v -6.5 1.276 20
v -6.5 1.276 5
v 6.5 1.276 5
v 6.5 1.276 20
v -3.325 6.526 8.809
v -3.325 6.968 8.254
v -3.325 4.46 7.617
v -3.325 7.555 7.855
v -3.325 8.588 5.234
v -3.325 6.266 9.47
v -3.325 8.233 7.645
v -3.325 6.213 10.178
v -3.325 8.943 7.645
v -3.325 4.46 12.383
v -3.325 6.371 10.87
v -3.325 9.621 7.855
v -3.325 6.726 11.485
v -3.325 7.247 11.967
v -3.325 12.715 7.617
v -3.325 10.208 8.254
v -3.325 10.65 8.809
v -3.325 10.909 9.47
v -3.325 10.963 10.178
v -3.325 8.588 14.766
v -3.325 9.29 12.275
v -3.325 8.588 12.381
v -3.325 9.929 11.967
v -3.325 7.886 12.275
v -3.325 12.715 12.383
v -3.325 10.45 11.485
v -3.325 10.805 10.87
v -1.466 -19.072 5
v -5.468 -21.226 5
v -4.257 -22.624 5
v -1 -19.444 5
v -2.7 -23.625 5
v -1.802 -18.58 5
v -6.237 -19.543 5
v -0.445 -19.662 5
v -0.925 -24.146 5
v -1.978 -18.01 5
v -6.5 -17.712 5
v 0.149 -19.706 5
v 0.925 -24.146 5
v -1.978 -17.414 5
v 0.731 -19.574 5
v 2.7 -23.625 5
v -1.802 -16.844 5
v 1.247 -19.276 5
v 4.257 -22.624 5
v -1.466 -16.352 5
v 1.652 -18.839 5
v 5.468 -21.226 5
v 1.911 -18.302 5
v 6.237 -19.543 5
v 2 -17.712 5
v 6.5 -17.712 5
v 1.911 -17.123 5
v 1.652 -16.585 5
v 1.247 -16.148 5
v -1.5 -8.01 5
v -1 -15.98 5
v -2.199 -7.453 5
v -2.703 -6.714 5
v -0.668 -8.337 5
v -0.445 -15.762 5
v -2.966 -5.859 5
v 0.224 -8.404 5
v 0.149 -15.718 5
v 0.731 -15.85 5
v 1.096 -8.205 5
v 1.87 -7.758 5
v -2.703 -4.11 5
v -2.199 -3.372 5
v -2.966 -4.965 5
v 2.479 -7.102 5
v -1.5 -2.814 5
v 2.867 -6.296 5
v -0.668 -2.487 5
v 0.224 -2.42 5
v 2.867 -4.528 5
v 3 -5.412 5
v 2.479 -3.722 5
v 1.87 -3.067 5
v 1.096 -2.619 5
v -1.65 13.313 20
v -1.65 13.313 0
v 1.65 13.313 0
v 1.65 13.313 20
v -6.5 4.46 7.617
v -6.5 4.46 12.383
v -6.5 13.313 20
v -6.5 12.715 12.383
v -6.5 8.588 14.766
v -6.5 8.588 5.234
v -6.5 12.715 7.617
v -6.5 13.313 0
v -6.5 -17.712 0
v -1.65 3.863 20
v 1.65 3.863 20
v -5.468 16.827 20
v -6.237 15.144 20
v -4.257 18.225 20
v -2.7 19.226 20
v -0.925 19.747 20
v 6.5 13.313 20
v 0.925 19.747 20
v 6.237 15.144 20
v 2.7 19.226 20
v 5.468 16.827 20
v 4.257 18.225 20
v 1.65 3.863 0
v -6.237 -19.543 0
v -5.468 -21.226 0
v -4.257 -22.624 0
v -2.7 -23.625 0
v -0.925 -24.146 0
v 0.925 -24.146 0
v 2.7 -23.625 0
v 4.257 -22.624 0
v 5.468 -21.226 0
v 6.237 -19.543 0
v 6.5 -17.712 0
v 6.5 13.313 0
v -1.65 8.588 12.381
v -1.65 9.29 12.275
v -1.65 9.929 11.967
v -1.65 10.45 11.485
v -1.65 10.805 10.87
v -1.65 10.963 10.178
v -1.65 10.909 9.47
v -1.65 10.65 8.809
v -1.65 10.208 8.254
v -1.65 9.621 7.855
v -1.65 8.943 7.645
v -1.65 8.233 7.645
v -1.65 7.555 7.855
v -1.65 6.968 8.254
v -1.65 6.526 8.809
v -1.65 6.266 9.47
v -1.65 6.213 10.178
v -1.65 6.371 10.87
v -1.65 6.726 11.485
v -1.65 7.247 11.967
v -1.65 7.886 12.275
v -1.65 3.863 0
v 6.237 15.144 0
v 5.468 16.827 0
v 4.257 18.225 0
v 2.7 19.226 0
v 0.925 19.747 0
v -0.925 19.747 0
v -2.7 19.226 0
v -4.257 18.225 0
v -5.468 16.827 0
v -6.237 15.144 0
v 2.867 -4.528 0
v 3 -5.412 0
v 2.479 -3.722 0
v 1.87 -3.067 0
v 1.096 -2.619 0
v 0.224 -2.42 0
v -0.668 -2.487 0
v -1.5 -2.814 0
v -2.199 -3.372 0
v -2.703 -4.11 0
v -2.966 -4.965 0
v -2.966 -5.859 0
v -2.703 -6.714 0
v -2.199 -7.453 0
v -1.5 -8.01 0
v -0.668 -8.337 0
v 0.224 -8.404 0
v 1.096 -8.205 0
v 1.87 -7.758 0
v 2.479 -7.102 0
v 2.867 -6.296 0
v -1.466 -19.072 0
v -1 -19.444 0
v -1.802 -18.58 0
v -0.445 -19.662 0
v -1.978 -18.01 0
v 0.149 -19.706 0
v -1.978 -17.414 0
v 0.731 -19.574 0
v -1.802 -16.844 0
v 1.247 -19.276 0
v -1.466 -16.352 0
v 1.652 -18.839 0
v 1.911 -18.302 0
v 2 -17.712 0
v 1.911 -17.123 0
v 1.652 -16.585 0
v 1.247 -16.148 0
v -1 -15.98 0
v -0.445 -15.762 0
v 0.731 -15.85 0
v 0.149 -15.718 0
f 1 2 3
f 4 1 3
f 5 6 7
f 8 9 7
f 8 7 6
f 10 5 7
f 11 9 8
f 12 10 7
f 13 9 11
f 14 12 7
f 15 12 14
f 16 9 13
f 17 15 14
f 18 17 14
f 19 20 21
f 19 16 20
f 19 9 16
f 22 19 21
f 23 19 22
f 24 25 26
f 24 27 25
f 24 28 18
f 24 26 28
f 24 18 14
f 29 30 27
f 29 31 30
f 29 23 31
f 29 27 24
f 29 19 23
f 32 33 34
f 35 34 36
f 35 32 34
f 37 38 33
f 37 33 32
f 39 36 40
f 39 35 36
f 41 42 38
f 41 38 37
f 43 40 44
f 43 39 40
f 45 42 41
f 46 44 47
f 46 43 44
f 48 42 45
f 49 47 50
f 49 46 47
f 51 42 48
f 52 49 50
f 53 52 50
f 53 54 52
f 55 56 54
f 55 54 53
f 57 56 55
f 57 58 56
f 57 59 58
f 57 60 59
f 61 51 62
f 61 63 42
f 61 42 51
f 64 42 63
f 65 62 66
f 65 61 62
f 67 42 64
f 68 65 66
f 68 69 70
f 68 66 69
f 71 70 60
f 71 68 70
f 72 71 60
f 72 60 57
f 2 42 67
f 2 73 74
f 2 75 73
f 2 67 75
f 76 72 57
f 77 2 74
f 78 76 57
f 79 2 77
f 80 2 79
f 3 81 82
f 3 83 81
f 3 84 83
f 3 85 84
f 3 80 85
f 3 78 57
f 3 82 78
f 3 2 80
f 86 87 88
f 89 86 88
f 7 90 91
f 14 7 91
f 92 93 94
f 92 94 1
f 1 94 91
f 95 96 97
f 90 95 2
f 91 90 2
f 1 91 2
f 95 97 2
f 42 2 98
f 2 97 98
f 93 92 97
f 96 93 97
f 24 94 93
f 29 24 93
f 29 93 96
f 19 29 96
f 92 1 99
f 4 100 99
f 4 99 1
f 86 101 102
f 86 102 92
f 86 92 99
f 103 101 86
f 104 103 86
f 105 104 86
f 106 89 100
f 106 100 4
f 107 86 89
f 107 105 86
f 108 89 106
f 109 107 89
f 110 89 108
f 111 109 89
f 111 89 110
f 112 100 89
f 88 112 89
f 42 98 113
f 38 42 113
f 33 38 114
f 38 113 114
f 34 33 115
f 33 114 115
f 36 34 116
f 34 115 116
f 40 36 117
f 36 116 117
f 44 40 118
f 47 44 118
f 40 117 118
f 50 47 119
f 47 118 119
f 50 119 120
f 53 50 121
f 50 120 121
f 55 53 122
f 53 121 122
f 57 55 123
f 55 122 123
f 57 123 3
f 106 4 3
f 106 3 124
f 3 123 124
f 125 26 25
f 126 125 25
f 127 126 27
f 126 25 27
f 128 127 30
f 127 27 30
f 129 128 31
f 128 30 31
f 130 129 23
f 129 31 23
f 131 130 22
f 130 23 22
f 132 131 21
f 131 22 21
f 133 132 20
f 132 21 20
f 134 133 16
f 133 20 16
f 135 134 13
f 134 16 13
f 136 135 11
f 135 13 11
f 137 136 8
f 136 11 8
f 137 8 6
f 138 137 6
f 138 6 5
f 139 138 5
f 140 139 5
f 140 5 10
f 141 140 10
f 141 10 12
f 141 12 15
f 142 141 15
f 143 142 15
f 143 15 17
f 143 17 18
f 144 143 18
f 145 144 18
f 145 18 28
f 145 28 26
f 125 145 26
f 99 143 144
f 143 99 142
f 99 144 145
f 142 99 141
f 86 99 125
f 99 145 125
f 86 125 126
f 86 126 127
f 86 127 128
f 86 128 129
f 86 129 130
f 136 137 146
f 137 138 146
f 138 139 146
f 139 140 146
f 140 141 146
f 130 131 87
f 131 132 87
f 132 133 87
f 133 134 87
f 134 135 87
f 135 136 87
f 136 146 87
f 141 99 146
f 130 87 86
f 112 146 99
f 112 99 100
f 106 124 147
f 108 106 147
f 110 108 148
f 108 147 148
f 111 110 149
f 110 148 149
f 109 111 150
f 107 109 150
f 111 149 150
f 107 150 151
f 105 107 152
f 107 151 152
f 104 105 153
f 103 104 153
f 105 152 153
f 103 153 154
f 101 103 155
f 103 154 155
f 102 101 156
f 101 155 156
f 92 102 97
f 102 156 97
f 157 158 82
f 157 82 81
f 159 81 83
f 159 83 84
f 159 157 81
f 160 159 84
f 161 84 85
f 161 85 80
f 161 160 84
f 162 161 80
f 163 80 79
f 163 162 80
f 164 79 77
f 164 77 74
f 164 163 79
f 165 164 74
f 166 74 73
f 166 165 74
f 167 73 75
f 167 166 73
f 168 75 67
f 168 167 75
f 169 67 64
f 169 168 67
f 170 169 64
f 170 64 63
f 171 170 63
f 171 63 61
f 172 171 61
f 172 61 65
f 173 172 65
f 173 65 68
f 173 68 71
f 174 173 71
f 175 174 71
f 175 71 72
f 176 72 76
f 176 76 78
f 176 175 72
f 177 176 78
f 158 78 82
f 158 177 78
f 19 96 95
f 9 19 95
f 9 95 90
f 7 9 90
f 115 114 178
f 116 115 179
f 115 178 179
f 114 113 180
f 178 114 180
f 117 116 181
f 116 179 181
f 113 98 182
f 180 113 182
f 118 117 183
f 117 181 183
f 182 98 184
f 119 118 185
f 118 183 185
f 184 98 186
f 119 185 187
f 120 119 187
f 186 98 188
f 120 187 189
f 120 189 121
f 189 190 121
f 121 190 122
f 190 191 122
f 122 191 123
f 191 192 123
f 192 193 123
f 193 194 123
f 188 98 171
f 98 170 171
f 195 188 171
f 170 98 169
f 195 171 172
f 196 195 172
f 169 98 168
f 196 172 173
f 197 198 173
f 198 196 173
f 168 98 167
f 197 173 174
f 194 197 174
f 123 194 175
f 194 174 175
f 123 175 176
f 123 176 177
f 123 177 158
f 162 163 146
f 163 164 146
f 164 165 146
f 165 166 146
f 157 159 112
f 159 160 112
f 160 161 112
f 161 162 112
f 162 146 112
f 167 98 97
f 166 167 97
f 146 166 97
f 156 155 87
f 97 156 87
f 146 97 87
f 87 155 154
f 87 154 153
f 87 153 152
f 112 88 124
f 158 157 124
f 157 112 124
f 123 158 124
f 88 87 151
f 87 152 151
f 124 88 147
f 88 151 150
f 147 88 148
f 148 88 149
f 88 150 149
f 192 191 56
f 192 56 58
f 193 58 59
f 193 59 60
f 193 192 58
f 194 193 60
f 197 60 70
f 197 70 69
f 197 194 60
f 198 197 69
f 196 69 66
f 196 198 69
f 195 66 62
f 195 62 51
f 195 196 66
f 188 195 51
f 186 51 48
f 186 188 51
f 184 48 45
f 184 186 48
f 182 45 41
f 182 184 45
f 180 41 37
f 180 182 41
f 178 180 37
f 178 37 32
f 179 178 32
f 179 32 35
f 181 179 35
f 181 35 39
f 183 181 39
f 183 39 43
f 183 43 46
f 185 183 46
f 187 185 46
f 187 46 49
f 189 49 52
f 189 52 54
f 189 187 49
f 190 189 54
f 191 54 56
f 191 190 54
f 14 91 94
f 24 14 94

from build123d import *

# Parameters (mm, degrees)
SKETCH1_R           = 2
SKETCH1_R_2         = 3
SKETCH1_W           = 3.3
SKETCH1_H           = 9.45
BOSS_EXTRUDE1_DEPTH = 5
SKETCH1_4_W         = 3.3
SKETCH1_4_H         = 9.45
BOSS_EXTRUDE2_DEPTH = 20
CUT_EXTRUDE1_DEPTH  = 3.175
CUT_EXTRUDE2_REACH  = 35.989
SKETCH2_3_R         = 2.38125


with BuildPart() as part:
    # Sketch1 → Boss-Extrude1 (new body)
    with BuildSketch(Plane.XY):
        with BuildLine():
            ThreePointArc((-6.5, -17.71207008), (0, -24.21207008), (6.5, -17.71207008))
            Line((6.5, -17.71207008), (6.5, 13.31292992))
            ThreePointArc((6.5, 13.31292992), (0, 19.81292992), (-6.5, 13.31292992))
            Line((-6.5, 13.31292992), (-6.5, -17.71207008))
        make_face()
        with Locations((0, -17.71207008)):
            Circle(SKETCH1_R, mode=Mode.SUBTRACT)
        with Locations((0, -5.41207008)):
            Circle(SKETCH1_R_2, mode=Mode.SUBTRACT)
        with Locations((0, 8.58792992)):
            Rectangle(SKETCH1_W, SKETCH1_H, mode=Mode.SUBTRACT)
    extrude(amount=BOSS_EXTRUDE1_DEPTH)

    # Sketch1<4> → Boss-Extrude2 (add)
    with BuildSketch(Plane.XY):
        with BuildLine():
            Line((-6.5, 13.31292992), (-6.5, 1.276325687))
            Line((-6.5, 1.276325687), (6.5, 1.276325687))
            Line((6.5, 1.276325687), (6.5, 13.31292992))
            ThreePointArc((6.5, 13.31292992), (0, 19.81292992), (-6.5, 13.31292992))
        make_face()
        with Locations((0, 8.58792992)):
            Rectangle(SKETCH1_4_W, SKETCH1_4_H, mode=Mode.SUBTRACT)
    extrude(amount=BOSS_EXTRUDE2_DEPTH)

    # Sketch2 → Cut-Extrude1 (cut)
    with BuildSketch(Plane.ZY.offset(6.5)):
        Polygon((14.766026472, 8.58792992), (12.383013236, 12.71542992), (7.616986764, 12.71542992), (5.233973528, 8.58792992), (7.616986764, 4.46042992), (12.383013236, 4.46042992), align=None)
    extrude(amount=-CUT_EXTRUDE1_DEPTH, mode=Mode.SUBTRACT)

    # Sketch2<3> → Cut-Extrude2 (cut, up to next)
    with BuildSketch(Plane.ZY.offset(6.5), mode=Mode.PRIVATE) as cut_extrude2_sk1:
        with Locations((10, 8.58792992)):
            Circle(SKETCH2_3_R)
    cut_extrude2_tool1 = extrude(cut_extrude2_sk1.sketch, amount=-CUT_EXTRUDE2_REACH, mode=Mode.PRIVATE) & part.part
    add(cut_extrude2_tool1.solids().sort_by_distance((-6.5, 8.58793, 10))[0], mode=Mode.SUBTRACT)


solid = part.part
